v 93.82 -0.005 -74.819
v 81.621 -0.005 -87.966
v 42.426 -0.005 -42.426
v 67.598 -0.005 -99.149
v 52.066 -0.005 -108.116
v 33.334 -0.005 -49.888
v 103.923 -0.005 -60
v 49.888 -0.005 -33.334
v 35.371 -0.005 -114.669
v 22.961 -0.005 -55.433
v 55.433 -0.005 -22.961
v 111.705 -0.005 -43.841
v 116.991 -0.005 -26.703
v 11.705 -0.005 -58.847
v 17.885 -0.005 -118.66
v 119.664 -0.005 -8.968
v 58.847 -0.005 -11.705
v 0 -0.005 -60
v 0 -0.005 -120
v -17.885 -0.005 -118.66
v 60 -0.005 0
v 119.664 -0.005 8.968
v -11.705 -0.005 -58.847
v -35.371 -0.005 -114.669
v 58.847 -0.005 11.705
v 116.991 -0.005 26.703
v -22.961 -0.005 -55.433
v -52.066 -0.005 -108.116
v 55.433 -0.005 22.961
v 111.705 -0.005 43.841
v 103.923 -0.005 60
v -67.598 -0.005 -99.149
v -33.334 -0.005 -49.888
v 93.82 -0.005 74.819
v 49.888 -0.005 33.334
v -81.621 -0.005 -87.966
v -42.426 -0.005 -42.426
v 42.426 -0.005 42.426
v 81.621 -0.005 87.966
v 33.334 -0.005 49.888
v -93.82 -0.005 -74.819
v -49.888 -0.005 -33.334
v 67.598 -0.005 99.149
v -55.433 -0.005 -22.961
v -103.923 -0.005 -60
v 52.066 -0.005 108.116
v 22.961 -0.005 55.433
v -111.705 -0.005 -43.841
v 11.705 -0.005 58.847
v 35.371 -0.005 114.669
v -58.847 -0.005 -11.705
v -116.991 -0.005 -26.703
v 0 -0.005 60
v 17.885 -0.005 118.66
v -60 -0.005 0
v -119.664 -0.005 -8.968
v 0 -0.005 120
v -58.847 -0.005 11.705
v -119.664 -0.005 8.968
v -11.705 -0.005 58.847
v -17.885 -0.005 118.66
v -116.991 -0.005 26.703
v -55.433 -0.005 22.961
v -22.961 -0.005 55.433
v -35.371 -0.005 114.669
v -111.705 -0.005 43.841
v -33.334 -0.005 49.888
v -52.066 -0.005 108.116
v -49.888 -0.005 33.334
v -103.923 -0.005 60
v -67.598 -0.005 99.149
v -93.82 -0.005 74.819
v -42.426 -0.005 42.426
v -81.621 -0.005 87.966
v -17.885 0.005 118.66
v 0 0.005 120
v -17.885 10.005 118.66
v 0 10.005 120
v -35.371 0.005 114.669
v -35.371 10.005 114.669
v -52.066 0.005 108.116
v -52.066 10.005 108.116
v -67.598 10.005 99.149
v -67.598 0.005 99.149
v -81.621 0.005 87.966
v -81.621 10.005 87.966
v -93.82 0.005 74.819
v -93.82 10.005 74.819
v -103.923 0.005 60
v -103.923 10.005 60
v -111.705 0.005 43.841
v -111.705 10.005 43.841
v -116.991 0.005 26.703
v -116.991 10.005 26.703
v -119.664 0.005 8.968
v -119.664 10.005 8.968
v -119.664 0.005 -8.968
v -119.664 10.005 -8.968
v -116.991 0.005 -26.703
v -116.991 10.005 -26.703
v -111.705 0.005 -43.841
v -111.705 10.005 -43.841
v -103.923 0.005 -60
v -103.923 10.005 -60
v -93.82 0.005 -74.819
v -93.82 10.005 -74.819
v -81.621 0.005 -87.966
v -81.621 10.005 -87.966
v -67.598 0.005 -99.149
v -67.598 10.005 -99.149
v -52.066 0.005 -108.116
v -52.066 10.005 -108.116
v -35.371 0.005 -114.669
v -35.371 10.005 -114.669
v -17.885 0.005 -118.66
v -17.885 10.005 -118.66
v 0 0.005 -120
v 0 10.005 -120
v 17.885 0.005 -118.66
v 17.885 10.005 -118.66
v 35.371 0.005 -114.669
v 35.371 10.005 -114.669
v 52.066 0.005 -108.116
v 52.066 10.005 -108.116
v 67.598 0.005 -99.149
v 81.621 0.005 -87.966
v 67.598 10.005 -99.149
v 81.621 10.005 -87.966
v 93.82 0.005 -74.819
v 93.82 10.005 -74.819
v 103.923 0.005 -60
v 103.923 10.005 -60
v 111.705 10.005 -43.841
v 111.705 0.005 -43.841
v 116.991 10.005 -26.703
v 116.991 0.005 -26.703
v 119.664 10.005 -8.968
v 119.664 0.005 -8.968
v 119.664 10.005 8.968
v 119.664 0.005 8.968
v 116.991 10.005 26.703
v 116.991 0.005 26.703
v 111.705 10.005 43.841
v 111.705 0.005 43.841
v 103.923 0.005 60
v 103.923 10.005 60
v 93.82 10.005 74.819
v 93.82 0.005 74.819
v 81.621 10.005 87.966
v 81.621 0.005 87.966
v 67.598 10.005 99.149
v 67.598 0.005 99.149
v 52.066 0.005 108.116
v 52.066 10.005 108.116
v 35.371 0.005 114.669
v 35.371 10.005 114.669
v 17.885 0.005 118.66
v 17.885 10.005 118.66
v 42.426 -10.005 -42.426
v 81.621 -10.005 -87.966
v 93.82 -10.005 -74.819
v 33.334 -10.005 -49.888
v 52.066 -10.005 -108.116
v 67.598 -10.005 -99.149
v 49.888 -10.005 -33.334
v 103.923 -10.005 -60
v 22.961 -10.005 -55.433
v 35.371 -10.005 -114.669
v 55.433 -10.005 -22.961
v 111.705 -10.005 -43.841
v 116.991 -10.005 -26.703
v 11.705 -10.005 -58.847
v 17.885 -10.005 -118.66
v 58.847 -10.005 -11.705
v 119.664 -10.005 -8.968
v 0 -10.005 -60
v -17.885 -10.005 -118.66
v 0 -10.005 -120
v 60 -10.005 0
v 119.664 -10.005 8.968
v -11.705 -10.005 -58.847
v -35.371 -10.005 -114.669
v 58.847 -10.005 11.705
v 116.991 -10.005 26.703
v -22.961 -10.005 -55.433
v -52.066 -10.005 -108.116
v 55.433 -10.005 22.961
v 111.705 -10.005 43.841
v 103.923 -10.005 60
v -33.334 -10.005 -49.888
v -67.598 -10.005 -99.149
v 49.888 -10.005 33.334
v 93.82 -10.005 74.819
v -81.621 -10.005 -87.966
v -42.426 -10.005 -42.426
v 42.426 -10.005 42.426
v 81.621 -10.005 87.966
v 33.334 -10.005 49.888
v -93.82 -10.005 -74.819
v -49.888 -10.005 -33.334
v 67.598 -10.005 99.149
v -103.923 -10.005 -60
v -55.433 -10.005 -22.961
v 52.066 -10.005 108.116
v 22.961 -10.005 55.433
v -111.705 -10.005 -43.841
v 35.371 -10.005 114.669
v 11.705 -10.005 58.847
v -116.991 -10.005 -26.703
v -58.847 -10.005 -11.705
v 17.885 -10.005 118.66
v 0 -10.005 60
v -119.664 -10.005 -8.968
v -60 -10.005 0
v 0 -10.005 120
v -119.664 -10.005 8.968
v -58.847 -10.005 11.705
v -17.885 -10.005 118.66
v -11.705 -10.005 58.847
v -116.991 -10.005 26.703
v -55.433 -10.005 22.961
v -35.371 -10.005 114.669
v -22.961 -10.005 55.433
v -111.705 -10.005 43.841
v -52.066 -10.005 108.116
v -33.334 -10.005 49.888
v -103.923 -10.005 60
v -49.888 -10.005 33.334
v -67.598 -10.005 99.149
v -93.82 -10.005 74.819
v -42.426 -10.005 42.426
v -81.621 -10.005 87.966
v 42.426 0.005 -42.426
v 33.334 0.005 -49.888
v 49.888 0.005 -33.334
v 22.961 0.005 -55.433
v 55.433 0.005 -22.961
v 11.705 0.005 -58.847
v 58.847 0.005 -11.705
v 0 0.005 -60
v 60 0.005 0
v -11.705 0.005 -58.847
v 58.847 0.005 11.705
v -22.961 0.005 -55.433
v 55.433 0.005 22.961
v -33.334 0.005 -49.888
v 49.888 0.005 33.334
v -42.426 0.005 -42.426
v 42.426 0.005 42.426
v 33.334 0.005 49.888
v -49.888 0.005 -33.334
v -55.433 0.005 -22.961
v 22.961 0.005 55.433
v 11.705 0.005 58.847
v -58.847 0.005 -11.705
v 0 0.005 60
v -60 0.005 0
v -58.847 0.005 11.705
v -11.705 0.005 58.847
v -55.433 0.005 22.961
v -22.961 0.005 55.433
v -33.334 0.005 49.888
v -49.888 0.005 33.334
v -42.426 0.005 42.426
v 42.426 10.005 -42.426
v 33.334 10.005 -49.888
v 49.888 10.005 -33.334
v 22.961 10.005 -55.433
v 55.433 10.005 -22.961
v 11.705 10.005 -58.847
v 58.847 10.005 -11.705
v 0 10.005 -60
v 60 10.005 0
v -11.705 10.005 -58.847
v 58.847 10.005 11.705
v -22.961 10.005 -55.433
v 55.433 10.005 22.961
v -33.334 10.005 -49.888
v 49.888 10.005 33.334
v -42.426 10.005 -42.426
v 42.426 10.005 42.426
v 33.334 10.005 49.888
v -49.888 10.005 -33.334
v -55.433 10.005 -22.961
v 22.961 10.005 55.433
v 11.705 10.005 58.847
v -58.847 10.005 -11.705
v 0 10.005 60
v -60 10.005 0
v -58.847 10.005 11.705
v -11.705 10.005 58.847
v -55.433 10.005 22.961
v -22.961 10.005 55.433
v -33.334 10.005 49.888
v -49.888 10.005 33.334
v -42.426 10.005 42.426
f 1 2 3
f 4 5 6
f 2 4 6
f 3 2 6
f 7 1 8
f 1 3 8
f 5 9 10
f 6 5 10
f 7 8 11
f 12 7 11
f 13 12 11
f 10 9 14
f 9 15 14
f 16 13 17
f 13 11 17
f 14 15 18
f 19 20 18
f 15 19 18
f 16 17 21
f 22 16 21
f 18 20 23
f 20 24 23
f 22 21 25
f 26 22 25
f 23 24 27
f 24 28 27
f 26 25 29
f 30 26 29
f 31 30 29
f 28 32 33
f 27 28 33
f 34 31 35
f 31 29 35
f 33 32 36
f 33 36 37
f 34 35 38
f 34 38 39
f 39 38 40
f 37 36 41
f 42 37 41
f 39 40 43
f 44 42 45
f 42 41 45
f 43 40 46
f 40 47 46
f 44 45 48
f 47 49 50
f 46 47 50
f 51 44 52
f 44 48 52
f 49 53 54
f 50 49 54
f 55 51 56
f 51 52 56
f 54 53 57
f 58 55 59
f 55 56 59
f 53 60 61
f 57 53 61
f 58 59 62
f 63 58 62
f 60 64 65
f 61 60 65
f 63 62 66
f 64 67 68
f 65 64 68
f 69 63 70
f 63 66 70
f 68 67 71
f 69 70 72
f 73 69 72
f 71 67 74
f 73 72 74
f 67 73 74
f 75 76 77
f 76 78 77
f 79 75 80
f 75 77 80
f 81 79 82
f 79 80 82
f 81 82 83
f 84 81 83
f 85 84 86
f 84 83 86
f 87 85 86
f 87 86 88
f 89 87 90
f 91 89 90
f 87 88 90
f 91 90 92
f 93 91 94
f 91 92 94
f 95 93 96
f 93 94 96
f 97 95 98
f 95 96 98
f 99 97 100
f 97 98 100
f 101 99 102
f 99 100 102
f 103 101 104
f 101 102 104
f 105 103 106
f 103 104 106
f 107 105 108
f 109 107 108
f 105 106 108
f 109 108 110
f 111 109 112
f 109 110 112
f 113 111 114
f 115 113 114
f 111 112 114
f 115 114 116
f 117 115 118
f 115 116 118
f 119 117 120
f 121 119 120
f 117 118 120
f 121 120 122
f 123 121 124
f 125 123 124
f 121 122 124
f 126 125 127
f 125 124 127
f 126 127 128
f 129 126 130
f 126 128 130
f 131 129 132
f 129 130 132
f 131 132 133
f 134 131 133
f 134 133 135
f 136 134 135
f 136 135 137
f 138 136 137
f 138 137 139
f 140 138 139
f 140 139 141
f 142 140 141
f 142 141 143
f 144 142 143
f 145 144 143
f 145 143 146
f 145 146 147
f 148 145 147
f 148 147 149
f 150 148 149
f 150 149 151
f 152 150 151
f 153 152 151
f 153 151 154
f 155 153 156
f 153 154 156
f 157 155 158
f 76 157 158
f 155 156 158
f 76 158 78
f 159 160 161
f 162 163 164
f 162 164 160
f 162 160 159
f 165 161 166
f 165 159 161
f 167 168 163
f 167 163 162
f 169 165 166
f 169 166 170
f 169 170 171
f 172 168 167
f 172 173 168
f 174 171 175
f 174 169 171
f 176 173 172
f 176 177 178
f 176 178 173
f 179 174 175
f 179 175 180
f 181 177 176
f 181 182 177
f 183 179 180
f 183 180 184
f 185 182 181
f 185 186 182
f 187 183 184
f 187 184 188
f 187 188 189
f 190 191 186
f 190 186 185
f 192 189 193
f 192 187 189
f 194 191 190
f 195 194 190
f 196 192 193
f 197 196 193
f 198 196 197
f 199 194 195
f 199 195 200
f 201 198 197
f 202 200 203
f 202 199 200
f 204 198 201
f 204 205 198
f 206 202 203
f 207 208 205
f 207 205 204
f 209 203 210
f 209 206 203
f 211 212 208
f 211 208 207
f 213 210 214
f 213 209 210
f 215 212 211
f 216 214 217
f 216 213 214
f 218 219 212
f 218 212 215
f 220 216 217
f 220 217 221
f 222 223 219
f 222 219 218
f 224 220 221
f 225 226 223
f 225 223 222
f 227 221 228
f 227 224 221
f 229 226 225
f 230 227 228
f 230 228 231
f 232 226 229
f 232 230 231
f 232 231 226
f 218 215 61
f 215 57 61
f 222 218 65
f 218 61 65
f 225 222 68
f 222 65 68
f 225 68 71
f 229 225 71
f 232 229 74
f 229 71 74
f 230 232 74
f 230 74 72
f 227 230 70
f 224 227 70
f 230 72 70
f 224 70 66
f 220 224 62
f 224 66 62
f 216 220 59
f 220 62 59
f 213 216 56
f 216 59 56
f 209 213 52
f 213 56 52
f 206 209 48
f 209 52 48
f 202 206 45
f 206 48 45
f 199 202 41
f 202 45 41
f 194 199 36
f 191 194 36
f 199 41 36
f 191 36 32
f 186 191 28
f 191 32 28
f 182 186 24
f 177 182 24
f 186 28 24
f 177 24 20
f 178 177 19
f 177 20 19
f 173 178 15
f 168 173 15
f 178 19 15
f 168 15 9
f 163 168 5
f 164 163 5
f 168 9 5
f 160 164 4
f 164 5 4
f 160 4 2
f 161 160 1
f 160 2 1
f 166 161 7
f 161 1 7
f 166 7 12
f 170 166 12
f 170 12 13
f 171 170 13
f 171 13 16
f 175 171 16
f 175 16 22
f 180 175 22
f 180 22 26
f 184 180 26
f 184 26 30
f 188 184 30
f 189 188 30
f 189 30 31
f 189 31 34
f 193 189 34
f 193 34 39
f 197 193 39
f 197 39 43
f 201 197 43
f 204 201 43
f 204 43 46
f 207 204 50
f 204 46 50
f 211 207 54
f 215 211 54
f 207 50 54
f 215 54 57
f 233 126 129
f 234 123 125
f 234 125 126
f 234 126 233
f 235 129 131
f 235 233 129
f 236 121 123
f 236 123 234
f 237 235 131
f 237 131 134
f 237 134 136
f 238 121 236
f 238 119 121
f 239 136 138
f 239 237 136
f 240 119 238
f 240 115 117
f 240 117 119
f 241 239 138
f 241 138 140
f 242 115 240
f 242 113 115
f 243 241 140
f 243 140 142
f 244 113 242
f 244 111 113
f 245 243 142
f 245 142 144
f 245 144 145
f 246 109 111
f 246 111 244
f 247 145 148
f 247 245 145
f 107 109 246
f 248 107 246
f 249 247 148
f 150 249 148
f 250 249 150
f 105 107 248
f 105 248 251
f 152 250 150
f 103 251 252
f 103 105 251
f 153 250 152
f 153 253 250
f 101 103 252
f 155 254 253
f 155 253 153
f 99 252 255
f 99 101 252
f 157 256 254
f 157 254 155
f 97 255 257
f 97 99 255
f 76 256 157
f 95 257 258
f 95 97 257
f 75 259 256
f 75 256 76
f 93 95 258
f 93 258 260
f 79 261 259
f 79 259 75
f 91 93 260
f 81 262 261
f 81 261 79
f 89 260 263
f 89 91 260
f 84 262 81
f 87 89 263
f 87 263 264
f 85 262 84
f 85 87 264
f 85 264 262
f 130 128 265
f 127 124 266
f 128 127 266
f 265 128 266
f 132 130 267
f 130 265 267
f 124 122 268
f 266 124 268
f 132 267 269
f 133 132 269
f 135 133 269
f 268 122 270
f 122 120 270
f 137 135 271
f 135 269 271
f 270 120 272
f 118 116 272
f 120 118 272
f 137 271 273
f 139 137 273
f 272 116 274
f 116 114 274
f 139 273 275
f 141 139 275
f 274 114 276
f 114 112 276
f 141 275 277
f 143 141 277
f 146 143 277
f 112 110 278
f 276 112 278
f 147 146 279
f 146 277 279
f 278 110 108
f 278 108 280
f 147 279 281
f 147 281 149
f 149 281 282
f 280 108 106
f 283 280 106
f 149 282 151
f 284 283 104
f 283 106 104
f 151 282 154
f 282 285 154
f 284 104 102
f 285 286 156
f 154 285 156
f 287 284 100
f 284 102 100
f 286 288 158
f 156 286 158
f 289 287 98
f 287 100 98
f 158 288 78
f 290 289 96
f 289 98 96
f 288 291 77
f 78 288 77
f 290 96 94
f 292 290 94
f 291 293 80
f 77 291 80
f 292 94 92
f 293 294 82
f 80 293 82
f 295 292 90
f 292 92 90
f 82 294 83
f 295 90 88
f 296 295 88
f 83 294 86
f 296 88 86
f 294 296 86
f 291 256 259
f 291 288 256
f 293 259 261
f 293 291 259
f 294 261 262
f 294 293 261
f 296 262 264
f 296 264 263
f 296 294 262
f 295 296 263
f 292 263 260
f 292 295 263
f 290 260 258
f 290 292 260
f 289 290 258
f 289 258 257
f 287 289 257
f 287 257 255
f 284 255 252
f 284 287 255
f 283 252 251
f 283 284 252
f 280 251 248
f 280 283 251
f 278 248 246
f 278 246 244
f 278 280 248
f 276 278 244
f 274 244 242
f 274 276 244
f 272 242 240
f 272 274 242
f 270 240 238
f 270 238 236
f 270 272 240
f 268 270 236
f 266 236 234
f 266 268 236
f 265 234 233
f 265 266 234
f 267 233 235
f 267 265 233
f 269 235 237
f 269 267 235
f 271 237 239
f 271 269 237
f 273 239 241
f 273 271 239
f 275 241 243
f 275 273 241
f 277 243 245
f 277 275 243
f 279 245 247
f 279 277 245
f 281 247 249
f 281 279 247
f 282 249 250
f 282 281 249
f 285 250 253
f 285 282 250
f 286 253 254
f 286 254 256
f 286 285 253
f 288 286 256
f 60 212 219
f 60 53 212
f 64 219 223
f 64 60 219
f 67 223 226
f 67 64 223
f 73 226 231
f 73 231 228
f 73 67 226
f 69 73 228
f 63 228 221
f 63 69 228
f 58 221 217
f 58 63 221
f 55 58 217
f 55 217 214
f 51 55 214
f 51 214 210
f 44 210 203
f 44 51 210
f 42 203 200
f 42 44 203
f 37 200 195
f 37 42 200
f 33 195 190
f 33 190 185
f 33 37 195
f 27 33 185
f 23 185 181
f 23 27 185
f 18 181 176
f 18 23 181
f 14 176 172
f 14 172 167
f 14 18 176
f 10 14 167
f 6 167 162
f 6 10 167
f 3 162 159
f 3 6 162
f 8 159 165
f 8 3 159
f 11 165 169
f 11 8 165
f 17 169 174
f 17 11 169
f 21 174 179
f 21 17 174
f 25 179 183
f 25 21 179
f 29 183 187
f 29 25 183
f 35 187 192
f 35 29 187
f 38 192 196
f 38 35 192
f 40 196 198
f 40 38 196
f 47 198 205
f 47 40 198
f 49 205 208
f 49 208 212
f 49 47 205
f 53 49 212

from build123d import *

# Parameters (mm, degrees)
SKETCH1_W = 60
SKETCH1_H = 10


with BuildPart() as part:
    # Sketch1 → Revolve1 (revolve)
    with BuildSketch(Plane(origin=(0, 0, 0), x_dir=(0, 0, -1), z_dir=(1, 0, 0))):
        with Locations((-90, 5.005)):
            Rectangle(SKETCH1_W, SKETCH1_H)
        with Locations((-90, -5.005)):
            Rectangle(SKETCH1_W, SKETCH1_H)
    revolve(axis=Axis((0, 64.898114619, 0), (0, -1, 0)))


solid = part.part
